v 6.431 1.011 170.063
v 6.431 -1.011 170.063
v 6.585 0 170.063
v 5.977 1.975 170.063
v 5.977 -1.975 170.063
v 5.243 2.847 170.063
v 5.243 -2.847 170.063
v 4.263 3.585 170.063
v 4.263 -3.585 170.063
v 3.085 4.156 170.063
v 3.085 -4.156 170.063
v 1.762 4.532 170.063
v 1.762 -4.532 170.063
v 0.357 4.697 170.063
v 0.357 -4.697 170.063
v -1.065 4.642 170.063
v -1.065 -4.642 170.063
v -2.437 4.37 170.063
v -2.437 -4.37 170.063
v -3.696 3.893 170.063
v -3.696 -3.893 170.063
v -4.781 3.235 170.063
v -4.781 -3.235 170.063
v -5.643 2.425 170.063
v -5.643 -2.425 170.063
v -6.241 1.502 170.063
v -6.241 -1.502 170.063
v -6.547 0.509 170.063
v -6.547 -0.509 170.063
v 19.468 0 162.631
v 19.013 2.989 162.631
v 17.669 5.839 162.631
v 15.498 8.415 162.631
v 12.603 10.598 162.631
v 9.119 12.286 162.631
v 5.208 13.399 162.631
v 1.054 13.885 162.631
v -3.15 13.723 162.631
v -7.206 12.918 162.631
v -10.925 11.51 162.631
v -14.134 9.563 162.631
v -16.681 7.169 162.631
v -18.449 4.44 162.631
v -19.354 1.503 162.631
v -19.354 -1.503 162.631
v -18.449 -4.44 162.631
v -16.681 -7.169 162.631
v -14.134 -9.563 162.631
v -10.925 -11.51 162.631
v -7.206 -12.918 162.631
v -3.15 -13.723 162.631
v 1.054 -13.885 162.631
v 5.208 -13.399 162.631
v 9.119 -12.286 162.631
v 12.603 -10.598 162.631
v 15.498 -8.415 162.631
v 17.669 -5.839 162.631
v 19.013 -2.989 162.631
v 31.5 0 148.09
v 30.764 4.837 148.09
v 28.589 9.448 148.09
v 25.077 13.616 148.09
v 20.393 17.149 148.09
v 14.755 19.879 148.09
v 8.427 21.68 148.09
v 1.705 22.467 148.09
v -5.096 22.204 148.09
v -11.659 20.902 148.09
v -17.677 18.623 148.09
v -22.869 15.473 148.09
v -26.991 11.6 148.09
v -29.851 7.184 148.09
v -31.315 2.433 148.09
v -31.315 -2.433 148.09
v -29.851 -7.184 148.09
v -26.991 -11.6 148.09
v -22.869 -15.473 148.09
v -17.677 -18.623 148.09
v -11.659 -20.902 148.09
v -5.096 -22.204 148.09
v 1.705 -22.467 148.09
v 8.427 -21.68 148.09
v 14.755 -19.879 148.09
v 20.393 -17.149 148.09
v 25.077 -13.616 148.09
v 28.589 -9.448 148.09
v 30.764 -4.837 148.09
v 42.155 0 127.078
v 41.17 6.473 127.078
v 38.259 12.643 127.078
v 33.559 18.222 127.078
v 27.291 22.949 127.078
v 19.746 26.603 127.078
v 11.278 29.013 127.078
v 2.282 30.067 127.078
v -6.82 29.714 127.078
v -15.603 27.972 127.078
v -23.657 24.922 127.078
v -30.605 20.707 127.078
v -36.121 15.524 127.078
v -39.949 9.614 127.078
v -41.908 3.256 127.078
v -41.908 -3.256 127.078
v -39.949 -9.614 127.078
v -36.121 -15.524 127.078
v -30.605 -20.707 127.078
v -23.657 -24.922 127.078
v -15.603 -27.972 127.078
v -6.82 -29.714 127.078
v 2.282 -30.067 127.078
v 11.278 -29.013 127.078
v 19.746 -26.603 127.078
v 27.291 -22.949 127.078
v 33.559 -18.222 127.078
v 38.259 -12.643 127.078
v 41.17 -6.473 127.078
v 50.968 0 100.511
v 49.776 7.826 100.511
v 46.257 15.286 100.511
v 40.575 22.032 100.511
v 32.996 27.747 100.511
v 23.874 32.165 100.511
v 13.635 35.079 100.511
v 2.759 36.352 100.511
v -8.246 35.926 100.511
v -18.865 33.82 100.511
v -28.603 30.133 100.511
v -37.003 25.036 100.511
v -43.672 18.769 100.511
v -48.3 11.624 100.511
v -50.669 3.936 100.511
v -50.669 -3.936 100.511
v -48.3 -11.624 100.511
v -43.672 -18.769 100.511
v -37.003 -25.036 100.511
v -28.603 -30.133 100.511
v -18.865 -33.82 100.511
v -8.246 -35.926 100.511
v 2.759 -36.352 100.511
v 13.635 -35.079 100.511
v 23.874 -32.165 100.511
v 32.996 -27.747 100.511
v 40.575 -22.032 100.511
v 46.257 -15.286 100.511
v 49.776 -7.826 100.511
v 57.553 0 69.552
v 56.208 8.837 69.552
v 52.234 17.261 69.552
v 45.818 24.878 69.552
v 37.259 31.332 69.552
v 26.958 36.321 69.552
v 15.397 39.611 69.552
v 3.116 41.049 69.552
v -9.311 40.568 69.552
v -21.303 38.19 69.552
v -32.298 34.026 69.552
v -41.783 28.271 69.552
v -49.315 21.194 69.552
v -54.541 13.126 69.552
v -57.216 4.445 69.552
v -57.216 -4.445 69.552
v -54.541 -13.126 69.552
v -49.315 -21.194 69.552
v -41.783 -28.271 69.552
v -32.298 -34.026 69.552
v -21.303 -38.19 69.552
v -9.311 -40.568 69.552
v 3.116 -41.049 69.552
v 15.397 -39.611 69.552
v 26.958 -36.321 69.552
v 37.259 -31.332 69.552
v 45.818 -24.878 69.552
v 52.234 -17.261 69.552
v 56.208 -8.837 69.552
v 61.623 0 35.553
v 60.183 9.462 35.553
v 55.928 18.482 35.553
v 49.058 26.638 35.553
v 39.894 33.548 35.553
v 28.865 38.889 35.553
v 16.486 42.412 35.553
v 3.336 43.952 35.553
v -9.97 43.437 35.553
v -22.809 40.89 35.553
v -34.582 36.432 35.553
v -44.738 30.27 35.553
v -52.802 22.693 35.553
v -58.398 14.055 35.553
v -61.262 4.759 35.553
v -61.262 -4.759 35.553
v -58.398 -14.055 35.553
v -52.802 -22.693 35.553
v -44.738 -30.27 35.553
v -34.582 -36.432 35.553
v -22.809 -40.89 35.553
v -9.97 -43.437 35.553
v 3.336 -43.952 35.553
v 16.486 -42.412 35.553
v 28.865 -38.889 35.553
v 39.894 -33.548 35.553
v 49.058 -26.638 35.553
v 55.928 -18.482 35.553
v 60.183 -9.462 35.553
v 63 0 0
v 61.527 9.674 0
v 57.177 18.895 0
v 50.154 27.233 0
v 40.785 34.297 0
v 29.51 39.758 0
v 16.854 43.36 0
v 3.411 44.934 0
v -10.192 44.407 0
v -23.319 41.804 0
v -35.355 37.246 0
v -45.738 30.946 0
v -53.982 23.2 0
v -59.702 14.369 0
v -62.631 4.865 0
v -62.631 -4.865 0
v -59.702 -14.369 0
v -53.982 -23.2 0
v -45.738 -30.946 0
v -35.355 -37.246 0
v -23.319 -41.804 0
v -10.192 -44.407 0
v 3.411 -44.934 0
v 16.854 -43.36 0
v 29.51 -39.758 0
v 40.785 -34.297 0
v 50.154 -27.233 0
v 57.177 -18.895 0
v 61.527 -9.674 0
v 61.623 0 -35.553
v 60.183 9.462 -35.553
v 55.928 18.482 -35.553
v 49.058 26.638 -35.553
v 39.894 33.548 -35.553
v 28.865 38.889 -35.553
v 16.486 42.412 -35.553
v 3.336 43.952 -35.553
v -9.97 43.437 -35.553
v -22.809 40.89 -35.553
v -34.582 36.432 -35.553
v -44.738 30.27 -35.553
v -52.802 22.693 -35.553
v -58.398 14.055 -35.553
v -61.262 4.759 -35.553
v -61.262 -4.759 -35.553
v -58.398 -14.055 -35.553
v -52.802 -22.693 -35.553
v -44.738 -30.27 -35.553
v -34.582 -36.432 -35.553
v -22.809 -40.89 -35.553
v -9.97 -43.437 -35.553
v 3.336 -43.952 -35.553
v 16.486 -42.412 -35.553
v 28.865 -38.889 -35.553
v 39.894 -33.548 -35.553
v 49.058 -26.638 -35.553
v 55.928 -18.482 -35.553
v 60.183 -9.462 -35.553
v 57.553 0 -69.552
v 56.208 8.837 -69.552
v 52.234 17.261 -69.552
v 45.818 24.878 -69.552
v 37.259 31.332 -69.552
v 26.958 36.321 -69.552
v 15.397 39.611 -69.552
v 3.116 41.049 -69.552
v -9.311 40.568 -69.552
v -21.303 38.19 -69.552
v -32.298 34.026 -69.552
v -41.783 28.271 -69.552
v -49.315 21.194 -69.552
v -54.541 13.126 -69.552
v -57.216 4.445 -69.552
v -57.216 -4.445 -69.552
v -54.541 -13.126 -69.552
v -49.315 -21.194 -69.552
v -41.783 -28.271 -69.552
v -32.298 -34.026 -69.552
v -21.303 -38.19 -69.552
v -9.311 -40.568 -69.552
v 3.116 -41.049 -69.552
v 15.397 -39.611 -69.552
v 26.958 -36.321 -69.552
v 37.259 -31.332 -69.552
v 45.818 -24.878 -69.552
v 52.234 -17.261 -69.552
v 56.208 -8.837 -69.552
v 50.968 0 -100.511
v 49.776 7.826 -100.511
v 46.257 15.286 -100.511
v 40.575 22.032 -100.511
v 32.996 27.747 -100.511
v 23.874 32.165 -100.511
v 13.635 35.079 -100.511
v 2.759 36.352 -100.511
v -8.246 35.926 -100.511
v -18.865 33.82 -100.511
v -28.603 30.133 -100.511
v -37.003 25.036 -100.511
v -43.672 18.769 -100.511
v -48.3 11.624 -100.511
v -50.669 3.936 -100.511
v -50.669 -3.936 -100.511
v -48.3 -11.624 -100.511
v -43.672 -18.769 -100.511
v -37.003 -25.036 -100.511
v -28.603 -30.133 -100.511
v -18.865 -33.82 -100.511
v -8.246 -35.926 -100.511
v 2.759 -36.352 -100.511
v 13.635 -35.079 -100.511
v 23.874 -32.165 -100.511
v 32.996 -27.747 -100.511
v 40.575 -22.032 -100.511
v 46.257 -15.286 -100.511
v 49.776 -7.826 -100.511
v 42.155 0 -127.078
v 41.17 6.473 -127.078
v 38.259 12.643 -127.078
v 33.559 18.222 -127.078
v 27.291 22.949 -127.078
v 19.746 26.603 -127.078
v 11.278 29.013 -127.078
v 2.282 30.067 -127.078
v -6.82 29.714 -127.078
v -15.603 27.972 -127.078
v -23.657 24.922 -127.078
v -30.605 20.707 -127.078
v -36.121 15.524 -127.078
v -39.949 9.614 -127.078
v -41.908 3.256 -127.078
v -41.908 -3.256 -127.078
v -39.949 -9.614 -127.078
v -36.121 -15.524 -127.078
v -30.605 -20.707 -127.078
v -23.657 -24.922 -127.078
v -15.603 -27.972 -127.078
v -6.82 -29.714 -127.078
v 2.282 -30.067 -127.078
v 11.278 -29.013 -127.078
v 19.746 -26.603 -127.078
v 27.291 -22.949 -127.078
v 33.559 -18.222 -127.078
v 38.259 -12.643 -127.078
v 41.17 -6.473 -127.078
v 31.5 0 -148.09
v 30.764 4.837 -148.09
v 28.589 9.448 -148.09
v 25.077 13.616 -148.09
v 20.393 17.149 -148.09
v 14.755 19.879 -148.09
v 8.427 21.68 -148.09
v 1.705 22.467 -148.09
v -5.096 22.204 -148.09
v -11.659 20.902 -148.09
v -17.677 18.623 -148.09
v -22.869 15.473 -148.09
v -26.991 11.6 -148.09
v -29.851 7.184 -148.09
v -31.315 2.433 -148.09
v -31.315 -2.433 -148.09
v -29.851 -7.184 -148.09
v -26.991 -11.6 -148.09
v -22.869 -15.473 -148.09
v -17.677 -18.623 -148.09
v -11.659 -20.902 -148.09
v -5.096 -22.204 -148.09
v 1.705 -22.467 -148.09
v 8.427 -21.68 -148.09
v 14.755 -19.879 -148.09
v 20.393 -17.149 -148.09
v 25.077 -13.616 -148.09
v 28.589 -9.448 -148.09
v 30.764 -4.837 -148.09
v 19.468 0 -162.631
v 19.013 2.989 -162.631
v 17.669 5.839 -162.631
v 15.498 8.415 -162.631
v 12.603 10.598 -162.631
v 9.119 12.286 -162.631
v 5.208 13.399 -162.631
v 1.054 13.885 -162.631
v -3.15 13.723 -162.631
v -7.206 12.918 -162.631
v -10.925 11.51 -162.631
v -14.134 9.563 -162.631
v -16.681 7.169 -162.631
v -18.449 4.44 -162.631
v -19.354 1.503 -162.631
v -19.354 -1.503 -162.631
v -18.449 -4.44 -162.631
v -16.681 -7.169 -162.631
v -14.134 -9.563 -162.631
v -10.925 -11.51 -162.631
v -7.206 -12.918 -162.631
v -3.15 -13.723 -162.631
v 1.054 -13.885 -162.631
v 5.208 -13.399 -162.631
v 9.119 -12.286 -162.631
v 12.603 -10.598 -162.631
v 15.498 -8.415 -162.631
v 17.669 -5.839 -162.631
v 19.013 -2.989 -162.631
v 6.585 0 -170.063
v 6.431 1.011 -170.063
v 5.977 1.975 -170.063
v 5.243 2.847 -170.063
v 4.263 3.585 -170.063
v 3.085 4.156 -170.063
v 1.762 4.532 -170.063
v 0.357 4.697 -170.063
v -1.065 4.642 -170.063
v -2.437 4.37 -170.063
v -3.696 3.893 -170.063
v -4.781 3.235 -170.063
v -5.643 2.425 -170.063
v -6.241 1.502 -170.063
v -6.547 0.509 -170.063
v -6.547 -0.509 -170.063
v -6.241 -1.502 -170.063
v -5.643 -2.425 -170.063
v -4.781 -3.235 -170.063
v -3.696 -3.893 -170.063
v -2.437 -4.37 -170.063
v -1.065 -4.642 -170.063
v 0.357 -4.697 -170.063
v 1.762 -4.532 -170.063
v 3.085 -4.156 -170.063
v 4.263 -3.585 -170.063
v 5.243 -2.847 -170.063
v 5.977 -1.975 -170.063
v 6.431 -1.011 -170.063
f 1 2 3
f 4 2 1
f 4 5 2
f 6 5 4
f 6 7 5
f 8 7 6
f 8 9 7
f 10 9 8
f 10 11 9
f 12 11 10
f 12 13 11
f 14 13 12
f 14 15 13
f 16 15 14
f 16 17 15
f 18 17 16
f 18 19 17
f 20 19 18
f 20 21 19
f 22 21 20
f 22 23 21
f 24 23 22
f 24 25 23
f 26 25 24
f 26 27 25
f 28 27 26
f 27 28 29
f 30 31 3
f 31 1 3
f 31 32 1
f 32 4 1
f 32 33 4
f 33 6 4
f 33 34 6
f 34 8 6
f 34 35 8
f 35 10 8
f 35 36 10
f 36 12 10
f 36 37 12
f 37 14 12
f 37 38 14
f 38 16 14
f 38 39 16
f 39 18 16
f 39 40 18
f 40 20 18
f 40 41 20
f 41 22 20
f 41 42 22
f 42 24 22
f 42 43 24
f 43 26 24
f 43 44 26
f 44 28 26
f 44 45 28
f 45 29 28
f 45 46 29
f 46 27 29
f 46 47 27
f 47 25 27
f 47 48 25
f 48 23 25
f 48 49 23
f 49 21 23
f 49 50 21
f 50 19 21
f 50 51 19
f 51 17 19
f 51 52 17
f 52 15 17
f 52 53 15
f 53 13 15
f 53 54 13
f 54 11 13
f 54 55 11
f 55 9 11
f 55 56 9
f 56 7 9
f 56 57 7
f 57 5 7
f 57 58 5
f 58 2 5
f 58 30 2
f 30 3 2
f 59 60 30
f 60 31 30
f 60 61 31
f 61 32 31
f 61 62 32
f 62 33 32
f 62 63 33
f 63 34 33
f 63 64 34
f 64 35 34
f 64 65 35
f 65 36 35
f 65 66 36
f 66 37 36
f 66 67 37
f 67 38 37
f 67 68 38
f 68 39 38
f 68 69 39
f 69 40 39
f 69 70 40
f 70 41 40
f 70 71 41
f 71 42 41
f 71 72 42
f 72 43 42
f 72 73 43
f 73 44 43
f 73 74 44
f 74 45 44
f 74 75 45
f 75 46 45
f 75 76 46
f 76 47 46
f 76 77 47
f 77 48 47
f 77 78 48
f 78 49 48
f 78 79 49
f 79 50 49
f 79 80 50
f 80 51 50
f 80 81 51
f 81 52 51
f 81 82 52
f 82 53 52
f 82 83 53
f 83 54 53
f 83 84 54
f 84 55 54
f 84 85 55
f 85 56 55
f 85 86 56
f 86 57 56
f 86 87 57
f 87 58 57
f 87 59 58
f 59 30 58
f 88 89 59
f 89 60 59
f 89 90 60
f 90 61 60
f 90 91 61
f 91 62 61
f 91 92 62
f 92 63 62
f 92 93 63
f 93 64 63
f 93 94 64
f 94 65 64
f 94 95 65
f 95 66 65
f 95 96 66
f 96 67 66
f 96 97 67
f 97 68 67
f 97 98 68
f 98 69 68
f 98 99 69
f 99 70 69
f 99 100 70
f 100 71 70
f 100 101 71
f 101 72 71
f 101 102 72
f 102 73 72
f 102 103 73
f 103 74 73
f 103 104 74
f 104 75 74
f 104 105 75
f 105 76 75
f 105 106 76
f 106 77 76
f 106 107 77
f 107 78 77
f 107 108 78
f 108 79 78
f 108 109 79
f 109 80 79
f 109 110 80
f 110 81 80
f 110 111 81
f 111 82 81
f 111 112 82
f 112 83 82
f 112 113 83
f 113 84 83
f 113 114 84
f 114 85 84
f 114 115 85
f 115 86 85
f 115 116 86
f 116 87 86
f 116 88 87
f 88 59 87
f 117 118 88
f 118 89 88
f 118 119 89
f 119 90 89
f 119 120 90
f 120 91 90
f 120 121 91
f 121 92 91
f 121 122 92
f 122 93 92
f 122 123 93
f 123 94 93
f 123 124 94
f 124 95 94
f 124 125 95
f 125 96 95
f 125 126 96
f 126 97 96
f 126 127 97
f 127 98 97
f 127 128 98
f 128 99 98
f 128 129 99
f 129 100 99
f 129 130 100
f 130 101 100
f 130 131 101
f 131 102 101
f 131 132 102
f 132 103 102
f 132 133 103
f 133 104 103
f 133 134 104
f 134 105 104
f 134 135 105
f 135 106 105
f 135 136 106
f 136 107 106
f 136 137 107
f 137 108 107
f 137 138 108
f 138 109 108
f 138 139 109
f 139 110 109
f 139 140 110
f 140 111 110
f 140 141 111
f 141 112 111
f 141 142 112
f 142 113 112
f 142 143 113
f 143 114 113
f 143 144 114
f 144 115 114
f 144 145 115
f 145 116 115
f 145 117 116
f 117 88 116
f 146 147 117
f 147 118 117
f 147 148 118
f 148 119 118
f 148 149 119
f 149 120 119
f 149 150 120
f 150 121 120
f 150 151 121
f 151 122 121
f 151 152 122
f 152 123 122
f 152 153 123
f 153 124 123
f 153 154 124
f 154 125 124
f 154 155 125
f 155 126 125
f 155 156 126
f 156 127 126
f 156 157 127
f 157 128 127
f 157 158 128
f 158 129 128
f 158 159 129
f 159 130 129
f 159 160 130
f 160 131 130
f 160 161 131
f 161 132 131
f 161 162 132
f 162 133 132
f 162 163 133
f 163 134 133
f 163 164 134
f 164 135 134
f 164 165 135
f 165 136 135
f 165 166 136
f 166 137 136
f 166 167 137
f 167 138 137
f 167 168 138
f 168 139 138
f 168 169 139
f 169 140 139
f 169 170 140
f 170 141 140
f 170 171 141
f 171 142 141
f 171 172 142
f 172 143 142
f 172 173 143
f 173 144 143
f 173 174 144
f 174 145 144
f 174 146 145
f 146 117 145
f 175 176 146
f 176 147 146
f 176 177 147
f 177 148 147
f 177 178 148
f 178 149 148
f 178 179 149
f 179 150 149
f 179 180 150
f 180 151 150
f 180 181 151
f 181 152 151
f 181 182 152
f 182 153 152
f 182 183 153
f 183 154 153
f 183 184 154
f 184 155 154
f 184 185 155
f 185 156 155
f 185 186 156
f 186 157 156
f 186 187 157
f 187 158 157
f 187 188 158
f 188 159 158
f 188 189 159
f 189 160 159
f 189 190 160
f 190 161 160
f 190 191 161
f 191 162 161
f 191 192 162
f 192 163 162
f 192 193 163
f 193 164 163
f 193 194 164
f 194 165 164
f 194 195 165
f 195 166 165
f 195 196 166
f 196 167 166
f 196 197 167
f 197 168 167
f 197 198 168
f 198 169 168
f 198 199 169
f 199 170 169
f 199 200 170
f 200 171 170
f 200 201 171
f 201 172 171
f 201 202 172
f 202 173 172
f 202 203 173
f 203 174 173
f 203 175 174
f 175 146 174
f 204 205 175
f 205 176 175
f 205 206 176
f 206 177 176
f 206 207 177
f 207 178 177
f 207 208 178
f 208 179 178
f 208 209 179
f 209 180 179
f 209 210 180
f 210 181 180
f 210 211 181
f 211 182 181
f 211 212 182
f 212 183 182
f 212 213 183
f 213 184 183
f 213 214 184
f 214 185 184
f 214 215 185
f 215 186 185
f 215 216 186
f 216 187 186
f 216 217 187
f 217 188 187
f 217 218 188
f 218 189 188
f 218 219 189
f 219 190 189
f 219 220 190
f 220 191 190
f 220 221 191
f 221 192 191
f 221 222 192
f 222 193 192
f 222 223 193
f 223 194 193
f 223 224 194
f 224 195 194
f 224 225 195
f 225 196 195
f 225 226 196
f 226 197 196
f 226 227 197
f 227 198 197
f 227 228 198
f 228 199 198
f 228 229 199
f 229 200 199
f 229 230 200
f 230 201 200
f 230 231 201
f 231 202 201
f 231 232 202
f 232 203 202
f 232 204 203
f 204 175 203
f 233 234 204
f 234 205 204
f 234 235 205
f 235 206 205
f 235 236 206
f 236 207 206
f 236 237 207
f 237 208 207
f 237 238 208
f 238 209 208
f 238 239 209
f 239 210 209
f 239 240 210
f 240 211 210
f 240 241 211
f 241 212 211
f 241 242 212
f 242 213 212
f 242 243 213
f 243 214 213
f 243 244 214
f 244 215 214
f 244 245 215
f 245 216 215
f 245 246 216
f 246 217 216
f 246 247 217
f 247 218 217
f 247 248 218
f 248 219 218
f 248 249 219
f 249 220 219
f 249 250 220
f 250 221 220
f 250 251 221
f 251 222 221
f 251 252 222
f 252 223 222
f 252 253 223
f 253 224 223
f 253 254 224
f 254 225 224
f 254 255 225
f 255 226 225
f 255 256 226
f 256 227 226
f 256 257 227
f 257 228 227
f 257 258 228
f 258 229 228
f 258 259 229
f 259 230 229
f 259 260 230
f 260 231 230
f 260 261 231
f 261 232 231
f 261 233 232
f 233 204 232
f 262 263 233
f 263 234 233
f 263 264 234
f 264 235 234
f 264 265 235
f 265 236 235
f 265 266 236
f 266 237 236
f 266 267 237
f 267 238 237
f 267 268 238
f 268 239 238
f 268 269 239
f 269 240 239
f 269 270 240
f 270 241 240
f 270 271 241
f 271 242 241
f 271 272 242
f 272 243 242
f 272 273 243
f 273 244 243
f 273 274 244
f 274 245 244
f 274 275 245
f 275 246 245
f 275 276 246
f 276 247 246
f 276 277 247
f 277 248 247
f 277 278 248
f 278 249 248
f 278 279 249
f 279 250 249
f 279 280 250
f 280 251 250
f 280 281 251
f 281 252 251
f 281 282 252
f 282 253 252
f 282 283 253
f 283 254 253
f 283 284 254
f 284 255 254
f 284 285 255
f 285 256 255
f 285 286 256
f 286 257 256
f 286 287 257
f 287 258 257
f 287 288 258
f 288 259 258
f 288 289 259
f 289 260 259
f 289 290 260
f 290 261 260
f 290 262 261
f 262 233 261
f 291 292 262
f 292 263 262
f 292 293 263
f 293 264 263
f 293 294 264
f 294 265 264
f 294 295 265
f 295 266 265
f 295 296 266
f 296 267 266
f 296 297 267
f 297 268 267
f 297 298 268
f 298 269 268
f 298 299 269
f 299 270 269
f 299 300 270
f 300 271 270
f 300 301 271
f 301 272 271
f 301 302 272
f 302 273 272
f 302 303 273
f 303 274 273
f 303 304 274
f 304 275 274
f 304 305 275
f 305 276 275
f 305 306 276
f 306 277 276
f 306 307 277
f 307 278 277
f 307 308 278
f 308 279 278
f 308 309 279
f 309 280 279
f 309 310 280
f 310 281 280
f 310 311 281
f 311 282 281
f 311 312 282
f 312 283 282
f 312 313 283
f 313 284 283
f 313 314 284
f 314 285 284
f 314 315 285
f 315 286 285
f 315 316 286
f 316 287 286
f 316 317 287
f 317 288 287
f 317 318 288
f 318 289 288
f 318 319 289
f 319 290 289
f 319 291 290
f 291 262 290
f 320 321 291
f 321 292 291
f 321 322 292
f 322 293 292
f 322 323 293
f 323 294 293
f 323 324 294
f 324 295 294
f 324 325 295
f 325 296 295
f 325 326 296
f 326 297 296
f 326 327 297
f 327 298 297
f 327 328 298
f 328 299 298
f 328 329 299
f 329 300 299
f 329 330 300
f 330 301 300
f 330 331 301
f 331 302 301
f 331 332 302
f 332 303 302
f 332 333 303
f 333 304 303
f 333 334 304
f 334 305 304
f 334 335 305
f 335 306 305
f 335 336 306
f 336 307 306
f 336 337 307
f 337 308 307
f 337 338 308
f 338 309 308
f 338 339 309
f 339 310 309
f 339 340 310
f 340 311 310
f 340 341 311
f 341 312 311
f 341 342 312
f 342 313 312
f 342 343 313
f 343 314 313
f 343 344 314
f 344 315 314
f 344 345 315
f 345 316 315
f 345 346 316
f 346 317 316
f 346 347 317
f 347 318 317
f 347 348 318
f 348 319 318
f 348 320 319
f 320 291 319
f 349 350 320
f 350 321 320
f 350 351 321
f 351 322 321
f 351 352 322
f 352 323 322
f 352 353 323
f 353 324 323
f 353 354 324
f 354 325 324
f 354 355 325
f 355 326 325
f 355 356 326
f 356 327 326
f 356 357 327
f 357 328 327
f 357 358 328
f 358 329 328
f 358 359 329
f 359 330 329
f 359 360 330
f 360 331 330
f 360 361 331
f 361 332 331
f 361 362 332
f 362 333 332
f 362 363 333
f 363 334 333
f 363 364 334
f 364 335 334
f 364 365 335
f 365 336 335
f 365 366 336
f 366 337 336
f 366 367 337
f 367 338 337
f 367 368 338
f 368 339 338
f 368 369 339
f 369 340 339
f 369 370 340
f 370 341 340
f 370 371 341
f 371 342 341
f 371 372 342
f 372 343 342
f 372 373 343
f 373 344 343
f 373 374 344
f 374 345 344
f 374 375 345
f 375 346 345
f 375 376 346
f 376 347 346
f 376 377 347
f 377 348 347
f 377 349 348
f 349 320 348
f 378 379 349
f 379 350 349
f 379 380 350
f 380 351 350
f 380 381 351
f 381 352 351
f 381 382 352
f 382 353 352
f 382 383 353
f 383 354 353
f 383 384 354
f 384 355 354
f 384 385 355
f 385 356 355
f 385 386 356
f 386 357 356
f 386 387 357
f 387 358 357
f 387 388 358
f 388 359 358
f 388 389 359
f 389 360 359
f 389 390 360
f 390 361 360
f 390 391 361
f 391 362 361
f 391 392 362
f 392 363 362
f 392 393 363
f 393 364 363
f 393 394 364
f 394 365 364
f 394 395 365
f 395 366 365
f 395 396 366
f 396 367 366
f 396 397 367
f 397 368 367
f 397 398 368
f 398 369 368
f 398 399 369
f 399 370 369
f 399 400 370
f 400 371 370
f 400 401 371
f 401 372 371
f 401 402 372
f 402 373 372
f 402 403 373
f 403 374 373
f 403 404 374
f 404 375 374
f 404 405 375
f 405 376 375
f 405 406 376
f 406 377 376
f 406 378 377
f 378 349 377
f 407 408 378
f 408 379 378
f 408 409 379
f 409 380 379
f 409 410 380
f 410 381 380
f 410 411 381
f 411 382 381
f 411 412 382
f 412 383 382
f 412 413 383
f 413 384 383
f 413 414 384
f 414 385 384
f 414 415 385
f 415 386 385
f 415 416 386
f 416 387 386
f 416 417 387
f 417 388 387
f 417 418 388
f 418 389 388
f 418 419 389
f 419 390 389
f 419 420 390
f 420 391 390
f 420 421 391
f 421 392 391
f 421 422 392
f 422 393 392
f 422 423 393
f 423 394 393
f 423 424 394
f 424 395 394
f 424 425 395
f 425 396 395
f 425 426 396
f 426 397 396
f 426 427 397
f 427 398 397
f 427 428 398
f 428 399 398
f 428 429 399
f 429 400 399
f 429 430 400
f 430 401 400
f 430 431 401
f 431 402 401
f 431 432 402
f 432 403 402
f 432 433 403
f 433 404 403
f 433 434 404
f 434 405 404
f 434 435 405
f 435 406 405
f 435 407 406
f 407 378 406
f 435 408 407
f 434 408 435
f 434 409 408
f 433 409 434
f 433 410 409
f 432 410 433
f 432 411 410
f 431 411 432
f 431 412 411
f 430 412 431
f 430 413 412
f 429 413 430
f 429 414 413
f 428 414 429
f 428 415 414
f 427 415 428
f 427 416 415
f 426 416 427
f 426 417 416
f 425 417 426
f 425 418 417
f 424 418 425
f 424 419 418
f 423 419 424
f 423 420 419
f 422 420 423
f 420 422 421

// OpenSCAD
// Generated by SolidPython 1.0.1 on 2020-07-29 00:46:47


scale(v = [7, 5, 19]) {
	sphere(r = 9);
}
/***********************************************
*********      SolidPython code:      **********
************************************************
 
# import packages: SolidPython
from solid import *
from solid.utils import *
from itertools import chain, combinations, permutations


class Resize:

    def __init__(self, scad_file):
        self.scad_file = scad_file
        #self.scad_file = import_scad(scad_file)
        # cone/cylinder param:
        self.r1 = 0
        self.r2 = 0
        self.h = 0
        # rectangular prism param:
        self.w = 0
        self.l = 0
        # ellipse param:
        self.r = 0

    # import OpenScad code (file name corresponds to shape)


    # classify shape + parameters
    def assign(self, param1, param2, param3):
        if self.scad_file == 'cone.scad':
            self.r1 = param1
            self.r2 = param2
            self.h = param3
        elif self.scad_file == 'cylinder.scad':
            self.r1 = param1
            self.r2 = param2
            self.h = param3
        elif self.scad_file == 'rectangularPrism.scad':
            self.h = param1
            self.l = param2
            self.w = param3
        else:
            self.r = param1
            self.h = param2

    # resize parameters
    def iterate(self):
        x = range(3, 20, 2)
        i = 1
        if self.scad_file == 'cone.scad':
            tempList = list(permutations(x, 2))
            for temp in tempList:
                param1 = temp[0]
                param2 = temp[1]
                filepath = 'produced_scad_files/' + 'cone' + str(param1) + '_' + str(param2) + '_' + '.scad'
                scad_render_to_file(cylinder(h=param1, r1=param2, r2=0), filepath)

        elif self.scad_file == 'cylinder.scad':
            tempList = list(permutations(x, 3))
            for temp in tempList:
                param1 = temp[0]
                param2 = temp[1]
                filepath = 'produced_scad_files/' + 'cylinder' + str(param1) + '_' + str(param2) + '_' + '.scad'
                scad_render_to_file(cylinder(h=param1, r1=param2, r2=param2), filepath)

        elif self.scad_file == 'rectangularPrism.scad':
            tempList = list(permutations(x, 3))
            for temp in tempList:
                param1 = temp[0]
                param2 = temp[1]
                param3 = temp[2]
                filepath = 'produced_scad_files/' + 'rectangularPrism' + str(param1) + '_' + str(param2) + '_' + str(
                    param3) + '.scad'
                scad_render_to_file(cube(size=(param1, param2, param3)), filepath)

        elif self.scad_file == 'ellipse.scad':
            tempList = list(permutations(x, 4))
            for temp in tempList:
                param1 = temp[0]
                param2 = temp[1]
                param3 = temp[2]
                param4 = temp[3]
                filepath = 'produced_scad_files/' + 'ellipse' + str(param1) + '_' + str(param2) + '_' + str(param3) + '_' + str(param4) + '.scad'
                scad_render_to_file(scale([param1, param2, param3])(sphere(r=param4)), filepath)

    def render_to_scadfile(self):
        scad_render_to_file(scad, 'example.scad') 
 
************************************************/
